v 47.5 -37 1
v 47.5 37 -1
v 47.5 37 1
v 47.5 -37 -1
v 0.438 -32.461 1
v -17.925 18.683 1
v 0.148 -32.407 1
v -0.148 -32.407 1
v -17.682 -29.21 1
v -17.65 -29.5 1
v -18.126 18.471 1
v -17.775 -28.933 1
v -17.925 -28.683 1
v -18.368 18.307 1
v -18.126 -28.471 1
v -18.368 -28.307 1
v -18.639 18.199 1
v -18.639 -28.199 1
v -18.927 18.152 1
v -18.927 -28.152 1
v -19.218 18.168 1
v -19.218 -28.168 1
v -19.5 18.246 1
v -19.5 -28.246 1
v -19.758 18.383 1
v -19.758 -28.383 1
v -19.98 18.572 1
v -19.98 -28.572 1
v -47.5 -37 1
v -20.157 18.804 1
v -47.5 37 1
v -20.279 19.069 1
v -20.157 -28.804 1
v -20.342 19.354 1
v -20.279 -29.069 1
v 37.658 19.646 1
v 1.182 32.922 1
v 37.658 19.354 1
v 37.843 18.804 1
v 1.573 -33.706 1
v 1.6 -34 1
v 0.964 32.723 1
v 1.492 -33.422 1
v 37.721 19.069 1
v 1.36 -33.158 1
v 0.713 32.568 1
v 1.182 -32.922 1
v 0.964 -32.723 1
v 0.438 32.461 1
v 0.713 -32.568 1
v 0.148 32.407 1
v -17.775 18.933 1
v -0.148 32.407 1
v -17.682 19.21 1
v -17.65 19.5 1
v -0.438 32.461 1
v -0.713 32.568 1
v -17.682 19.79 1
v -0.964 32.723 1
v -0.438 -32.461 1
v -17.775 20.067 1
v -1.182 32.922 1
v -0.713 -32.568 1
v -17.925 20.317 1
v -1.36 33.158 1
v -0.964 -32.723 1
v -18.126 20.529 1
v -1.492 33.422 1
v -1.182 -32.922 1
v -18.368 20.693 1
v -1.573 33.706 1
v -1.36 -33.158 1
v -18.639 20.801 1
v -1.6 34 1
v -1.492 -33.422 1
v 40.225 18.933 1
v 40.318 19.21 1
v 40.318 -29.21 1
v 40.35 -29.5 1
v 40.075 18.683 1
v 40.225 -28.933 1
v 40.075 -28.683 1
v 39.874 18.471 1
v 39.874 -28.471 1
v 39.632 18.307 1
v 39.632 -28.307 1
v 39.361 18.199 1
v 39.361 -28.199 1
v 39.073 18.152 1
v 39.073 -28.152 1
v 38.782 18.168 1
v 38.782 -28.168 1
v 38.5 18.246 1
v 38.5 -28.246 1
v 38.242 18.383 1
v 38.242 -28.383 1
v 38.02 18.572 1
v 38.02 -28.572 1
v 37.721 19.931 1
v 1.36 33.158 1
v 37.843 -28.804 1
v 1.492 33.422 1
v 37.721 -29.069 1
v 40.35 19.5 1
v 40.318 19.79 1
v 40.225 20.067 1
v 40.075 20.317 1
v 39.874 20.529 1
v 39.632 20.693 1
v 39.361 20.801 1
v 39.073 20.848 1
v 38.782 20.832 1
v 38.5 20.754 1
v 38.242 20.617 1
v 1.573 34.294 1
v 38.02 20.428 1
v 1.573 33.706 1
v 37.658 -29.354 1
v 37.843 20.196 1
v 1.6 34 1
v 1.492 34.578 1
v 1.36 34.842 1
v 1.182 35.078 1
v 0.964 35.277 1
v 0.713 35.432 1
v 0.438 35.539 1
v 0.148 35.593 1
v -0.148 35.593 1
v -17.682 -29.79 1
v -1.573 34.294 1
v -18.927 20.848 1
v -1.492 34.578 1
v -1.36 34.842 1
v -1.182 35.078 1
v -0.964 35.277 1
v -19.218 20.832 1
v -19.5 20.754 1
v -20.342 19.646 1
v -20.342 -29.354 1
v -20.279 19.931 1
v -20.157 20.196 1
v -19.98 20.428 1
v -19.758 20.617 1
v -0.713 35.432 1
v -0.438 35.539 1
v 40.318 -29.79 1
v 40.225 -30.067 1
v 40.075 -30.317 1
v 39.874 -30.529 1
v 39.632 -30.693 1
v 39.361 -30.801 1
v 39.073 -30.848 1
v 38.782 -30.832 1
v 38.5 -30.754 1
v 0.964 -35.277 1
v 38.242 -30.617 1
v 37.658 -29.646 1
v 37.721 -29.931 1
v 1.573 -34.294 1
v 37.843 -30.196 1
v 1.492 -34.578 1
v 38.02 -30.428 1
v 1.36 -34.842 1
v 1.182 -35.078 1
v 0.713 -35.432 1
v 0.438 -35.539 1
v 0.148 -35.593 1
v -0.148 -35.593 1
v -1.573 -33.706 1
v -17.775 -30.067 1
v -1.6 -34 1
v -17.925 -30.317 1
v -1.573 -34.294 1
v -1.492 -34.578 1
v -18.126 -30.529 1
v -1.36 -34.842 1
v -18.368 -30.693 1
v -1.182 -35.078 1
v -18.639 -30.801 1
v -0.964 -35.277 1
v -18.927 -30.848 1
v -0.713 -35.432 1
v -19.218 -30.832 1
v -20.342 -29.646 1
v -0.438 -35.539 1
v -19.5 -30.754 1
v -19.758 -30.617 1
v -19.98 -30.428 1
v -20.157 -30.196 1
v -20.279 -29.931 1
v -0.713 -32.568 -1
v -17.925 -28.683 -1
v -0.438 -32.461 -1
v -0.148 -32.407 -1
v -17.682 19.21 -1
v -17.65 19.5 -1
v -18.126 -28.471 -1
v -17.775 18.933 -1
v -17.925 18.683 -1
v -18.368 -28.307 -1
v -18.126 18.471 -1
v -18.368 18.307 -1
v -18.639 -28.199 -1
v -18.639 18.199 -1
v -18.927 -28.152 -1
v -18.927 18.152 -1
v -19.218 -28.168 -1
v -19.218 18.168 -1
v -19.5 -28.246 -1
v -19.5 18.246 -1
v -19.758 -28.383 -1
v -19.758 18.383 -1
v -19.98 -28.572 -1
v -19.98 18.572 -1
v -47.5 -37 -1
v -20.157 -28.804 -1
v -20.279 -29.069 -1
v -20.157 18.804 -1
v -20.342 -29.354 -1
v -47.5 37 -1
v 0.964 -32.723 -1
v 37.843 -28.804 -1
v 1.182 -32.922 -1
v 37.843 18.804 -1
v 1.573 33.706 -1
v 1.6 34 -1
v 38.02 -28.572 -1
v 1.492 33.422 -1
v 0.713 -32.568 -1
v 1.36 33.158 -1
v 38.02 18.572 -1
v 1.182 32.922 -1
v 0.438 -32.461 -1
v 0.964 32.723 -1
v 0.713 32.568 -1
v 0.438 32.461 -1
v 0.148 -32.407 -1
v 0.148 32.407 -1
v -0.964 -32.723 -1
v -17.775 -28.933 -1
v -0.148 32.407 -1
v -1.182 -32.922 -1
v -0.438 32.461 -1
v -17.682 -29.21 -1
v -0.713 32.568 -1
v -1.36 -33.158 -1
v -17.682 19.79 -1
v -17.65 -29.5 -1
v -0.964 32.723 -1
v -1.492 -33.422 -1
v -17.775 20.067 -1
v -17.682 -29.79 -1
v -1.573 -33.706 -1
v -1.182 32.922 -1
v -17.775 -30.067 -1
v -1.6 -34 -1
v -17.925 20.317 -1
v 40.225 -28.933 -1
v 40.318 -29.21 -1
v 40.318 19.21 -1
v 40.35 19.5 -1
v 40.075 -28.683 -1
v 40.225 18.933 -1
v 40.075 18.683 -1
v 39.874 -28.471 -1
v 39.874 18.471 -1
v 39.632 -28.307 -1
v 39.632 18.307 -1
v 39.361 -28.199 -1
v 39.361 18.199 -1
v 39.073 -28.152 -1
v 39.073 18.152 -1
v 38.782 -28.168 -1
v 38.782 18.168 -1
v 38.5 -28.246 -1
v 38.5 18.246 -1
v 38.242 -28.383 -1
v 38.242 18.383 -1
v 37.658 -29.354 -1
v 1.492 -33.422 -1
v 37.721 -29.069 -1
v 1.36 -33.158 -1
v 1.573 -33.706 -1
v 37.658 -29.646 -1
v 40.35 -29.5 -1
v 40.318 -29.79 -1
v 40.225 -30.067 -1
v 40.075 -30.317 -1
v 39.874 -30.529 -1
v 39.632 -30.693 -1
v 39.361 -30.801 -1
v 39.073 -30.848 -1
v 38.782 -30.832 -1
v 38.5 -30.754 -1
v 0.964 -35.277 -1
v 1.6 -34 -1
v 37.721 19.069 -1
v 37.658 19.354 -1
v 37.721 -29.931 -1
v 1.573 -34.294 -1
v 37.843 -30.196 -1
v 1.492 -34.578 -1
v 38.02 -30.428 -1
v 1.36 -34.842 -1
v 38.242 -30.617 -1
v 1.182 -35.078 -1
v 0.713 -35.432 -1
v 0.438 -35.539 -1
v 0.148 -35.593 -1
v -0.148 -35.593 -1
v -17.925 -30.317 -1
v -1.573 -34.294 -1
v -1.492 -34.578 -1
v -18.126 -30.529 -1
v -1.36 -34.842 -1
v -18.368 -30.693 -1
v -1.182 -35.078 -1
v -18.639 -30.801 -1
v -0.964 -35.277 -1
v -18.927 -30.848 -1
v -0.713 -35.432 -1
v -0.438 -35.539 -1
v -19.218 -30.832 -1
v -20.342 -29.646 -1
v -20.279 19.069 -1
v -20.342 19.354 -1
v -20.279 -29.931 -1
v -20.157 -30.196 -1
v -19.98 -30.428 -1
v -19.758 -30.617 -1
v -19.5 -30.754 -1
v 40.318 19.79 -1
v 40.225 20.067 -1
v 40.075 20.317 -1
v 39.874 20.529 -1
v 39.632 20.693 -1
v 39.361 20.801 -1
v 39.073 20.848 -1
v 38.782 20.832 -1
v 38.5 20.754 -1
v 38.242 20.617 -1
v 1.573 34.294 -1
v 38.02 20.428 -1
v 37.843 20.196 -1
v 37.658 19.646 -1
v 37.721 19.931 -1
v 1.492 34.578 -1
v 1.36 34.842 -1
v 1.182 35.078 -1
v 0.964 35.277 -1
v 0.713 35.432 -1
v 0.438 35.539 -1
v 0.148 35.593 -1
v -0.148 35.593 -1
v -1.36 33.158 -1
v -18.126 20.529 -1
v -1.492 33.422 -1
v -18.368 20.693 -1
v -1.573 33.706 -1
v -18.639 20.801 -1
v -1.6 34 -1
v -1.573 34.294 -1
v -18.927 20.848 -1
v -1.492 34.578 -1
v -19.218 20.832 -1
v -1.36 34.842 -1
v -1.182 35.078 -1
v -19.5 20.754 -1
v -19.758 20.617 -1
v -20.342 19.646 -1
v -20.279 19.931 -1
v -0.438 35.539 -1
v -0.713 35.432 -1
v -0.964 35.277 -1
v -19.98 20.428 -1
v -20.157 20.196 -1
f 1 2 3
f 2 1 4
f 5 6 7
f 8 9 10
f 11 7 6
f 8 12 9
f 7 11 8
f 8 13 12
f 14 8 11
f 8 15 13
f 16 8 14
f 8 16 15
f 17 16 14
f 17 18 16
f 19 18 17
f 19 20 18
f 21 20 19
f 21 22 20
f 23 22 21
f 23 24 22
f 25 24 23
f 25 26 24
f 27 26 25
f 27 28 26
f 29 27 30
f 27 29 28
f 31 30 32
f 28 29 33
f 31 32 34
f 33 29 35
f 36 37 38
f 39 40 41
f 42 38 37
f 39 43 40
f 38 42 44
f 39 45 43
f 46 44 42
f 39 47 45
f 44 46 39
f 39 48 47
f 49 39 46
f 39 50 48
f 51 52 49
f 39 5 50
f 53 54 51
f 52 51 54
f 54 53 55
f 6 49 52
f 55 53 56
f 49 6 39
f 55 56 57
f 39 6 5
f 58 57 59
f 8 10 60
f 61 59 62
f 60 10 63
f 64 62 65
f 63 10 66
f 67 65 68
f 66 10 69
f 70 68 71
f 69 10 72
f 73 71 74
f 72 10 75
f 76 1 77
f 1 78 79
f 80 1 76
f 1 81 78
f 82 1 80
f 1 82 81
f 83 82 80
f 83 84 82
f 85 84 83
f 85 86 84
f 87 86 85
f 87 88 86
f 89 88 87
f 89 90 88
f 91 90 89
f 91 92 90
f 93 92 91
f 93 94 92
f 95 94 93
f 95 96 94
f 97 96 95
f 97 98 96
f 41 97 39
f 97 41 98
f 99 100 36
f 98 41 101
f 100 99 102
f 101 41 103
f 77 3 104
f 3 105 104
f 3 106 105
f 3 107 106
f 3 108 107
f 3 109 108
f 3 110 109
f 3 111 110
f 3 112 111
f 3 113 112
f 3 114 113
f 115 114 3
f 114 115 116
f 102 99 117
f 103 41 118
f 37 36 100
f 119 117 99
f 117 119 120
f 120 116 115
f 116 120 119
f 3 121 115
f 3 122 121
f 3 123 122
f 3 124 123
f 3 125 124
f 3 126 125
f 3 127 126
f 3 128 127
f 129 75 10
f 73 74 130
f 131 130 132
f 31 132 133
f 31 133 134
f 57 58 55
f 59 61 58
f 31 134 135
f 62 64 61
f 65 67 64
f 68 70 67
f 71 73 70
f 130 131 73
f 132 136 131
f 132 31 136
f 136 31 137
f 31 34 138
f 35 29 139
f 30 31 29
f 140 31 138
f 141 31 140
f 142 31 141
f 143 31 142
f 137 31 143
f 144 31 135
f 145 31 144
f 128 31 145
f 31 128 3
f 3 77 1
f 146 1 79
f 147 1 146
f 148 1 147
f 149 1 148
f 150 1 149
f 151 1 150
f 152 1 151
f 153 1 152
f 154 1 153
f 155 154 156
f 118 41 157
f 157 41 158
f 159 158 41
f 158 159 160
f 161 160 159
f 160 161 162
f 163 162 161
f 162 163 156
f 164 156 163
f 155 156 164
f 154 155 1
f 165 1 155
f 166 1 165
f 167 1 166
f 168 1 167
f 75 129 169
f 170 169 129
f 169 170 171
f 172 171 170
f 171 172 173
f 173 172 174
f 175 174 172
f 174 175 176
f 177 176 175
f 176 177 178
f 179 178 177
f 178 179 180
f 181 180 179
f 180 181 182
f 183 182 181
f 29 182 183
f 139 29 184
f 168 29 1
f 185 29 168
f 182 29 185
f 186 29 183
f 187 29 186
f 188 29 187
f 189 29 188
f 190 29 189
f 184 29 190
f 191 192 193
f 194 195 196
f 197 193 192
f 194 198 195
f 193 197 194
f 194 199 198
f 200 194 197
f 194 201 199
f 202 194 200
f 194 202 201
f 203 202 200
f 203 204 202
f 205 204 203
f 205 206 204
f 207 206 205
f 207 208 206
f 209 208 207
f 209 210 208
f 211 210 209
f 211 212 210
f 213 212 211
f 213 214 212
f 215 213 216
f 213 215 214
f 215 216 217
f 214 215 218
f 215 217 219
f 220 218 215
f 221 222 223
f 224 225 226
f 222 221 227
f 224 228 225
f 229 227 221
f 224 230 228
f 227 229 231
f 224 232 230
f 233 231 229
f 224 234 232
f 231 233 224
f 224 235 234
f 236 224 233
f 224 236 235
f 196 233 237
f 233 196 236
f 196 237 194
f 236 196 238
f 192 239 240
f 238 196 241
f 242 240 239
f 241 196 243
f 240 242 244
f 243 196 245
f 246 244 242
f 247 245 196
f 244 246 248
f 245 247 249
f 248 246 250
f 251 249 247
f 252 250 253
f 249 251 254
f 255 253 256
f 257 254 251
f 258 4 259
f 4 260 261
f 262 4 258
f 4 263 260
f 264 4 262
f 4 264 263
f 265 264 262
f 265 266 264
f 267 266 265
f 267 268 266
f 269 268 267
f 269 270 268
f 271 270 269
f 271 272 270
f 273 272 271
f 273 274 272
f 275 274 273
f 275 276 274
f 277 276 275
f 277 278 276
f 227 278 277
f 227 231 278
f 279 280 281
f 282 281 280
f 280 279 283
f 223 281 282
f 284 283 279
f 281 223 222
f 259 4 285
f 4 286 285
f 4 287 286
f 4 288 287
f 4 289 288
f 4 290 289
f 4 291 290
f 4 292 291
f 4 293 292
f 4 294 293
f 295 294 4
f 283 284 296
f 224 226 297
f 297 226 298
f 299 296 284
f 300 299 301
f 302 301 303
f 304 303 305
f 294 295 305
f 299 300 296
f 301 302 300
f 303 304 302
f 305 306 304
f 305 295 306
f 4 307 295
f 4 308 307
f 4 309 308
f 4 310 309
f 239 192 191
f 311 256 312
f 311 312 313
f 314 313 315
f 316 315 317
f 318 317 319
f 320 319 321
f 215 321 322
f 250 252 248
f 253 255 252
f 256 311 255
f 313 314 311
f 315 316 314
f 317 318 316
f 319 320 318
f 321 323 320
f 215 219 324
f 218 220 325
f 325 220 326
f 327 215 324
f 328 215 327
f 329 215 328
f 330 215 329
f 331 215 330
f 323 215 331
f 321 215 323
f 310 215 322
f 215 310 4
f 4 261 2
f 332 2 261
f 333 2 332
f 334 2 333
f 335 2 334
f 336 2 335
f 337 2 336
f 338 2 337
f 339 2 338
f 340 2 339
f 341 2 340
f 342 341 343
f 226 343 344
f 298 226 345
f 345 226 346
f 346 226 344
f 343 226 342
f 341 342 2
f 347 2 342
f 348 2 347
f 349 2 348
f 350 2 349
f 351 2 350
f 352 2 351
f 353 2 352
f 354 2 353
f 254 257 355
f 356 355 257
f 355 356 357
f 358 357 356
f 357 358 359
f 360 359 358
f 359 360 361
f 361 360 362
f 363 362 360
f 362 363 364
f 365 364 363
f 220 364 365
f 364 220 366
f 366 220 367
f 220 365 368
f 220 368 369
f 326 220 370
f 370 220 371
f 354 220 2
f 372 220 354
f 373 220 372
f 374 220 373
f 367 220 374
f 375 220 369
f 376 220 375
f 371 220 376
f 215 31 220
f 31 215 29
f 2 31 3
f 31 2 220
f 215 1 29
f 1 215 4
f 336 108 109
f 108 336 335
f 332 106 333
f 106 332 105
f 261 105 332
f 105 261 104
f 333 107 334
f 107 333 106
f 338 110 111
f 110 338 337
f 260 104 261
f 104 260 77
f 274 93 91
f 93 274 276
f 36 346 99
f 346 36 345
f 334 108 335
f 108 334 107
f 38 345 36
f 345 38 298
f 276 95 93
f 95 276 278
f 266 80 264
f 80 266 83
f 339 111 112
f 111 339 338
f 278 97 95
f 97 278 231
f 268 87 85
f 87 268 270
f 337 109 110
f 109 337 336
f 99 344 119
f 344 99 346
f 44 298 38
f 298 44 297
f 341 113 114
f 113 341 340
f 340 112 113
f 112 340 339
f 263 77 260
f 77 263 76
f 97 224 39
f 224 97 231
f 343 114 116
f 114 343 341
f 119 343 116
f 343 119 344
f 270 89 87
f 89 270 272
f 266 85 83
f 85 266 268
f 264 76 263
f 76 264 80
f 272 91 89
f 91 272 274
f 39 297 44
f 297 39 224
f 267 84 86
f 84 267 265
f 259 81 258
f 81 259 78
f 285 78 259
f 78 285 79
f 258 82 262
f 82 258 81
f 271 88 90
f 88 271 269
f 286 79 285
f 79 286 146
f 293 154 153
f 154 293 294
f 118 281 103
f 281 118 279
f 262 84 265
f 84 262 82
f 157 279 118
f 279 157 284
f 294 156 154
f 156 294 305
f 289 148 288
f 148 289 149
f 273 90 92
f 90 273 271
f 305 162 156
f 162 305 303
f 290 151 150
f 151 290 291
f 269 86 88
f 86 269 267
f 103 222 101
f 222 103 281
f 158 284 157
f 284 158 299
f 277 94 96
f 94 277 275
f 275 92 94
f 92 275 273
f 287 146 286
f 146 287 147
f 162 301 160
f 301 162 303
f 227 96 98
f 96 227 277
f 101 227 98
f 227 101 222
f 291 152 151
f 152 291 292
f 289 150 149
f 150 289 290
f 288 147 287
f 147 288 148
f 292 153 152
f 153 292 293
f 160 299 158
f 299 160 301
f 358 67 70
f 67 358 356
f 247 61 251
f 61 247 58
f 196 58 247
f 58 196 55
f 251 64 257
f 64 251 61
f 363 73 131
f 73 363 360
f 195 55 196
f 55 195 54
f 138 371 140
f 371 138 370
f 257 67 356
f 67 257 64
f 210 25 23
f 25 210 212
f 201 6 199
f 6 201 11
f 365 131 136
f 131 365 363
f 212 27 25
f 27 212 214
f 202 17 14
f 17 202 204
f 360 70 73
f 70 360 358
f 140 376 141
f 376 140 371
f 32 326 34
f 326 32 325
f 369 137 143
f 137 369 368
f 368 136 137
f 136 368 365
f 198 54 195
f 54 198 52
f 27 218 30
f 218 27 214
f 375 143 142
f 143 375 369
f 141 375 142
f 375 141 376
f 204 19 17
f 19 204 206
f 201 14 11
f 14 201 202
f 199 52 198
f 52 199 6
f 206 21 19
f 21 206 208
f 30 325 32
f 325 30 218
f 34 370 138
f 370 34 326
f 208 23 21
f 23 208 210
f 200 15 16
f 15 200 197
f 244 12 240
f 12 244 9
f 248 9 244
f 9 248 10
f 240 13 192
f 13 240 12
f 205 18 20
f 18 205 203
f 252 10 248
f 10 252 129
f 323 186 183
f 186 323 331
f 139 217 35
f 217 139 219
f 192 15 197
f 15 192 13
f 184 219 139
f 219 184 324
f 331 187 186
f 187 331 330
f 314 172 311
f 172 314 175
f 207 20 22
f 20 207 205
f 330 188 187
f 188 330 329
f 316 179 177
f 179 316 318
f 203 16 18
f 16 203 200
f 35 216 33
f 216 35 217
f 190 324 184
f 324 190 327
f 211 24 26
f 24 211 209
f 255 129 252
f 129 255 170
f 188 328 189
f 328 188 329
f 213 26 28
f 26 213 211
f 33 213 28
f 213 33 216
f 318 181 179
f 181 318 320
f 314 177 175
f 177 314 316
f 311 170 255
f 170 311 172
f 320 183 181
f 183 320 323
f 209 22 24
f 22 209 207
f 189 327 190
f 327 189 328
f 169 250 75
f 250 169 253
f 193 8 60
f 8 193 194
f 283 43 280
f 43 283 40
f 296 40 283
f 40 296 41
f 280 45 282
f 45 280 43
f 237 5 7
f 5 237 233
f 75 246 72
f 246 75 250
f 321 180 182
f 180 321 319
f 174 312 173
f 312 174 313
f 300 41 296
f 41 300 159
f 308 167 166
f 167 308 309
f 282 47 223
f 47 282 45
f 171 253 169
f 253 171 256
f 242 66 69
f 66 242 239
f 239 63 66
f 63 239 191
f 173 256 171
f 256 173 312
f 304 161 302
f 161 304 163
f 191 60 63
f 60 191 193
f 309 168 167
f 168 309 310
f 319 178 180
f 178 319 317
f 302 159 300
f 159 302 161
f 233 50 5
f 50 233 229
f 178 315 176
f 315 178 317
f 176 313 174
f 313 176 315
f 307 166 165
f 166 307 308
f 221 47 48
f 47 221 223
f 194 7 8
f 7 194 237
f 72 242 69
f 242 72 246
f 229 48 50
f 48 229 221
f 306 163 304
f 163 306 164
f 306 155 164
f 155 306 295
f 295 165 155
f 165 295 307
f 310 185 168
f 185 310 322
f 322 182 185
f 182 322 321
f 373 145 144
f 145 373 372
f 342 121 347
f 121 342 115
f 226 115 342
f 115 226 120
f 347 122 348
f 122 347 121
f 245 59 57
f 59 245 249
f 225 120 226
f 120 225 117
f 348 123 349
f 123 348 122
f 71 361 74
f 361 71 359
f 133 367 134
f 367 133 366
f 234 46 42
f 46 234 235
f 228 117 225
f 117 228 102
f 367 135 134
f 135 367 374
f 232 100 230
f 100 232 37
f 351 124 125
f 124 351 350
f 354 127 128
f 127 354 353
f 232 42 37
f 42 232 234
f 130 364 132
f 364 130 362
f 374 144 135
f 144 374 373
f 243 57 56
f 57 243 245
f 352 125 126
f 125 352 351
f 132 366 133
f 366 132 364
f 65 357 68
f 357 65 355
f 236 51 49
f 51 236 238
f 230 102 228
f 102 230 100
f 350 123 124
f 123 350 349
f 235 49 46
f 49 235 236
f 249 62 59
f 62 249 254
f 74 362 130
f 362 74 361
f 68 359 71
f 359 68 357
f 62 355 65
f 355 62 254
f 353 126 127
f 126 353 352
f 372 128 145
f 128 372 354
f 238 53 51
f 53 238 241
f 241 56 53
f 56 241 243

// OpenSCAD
// file: Cos.scad
include <config.scad>

$fa = 3;
$fs = 0.3;

// Cos principal

module cilindre(D=diameter_cyli, d=inner_diameter, l=height_cyli){
rotate([0,90,0])
difference(){
cylinder(h=l,d=D,center=true);
    cylinder(h=l+0.05,d=d,center=true);
}

}


module semi_esfera(D=diameter_cyli, d=inner_diameter){
difference(){
difference(){
    sphere(d=D);
    sphere(d=d);
    }
    translate([-d,0,0])
    cube(size=d*2,center=true);
}
}
module cos_principal(D=diameter_cyli, d=inner_diameter, l=height_cyli){
union(){
color("yellow",0.5){
cilindre(D=D, d=d, l=l);
    
}
translate([l/2,0,0])
color([0,1,1],0.6){
semi_esfera(D=D, d=d);}
}
}
cos_principal();
// file: config.scad
// Configuració general

// Cos principal
height_cyli = 298;
wall_width = 6.35;
inner_diameter = 76;
diameter_cyli = inner_diameter + wall_width*2;

// Bateria LIPO
w1 = 47;
h1 = 26;

// Bateria Raspi
w2 = 61;
h2 = 21;
// file: estruct_intern.scad
include <config.scad>
use <Cos.scad>

$fa = 2;
$fs = 0.3;

// Moduls
module suport_lipo(thickness=5, diameter=inner_diameter-0.5, h=26, w=47){
rotate([0,90,0])
difference() {
cylinder(h=thickness, d=diameter, center=true);

// Bateria LIPO
translate([10,0,0])
color("#00c5ff") cube([h+0.4,w+0.4,thickness+0.5],center=true);
    translate([-20,0,0])
    cube([10,30,thickness+0.5],center=true);
    translate([30,0,0])
    cylinder(h=thickness+0.2,d=6.2,center=true);
    
    translate([-10,20,0])
    cylinder(h=thickness+0.2, d=6.2, center=true);
    translate([-10,-20,0])
    cylinder(h=thickness+0.2, d=6.2, center=true);
     translate([-5,-inner_diameter/2+5-1,0])
    cylinder(h=thickness+05,d=4,center=true);
        translate([-5,-(-inner_diameter/2+5-1),0])
        cylinder(h=thickness+05,d=4,center=true);
    
}
}
module suport_bater(thickness=5, diameter=inner_diameter-0.5, h=21, w=61){
rotate([0,90,0])
difference() {
cylinder(h=thickness, d=diameter, center=true);

// Bateria raspy
translate([h2/2-3,0,0])
color("#00c5ff") cube([h+0.4,w+0.4,thickness+0.5],center=true);
    difference(){
cylinder(h=thickness+0.3, d=diameter-25, center=true);
translate([20,0,0])
        cube([20,40,thickness],center=true);
        }
        translate([-30,0,0])
        rotate([0,90,0])
        cylinder(h=20, d=4, center=true);
        translate([30,0,0])
 cylinder(h=thickness+0.2,d=6.2,center=true);
        translate([-5,-inner_diameter/2+5-1,0])
        cylinder(h=thickness+05,d=4,center=true);
        translate([-5,-(-inner_diameter/2+5-1),0])
        cylinder(h=thickness+05,d=4,center=true);
        
       
}}

module lipo(l=155, h=26, w=47){
    color("#baa0a9") cube([l,w,h],center=true);
}

module batery(l=90, h=21, w=61){
    color("#135363") cube([l,w,h],center=true);
}
module suport_raspi(){
    
    difference(){
    color("#248113") cube([95,74,2],center=true);
        translate([85/2-3.5,19.5,0])
        cylinder(h=2.2,d=2.7,center=true);
        translate([85/2-3.5,-29.5,0])
        cylinder(h=2.2,d=2.7,center=true);
        translate([-19,19.5,0])
        cylinder(h=2.2,d=2.7,center=true);
        translate([-19,-29.5,0])
        cylinder(h=2.2,d=2.7,center=true);
        translate([0,-34,0])
        cylinder(h=2.2, d=3.2,center=true);
        translate([0,+34,0])
        cylinder(h=2.2, d=3.2,center=true);
        }
        
    
}
module camera(){
    union(){
    color("#3a3a3a") cylinder(h=6, d=14, center=true);
    translate([-3,0,-3.5])
        difference(){
    color("#c33310") cube([24,25,1],center=true);
            translate([10,21/2,0])
            cylinder(h=1.1, d=2, center=true);
            translate([10,-21/2,0])
            cylinder(h=1.1, d=2, center=true);
            translate([-4,21/2,0])
            cylinder(h=1.1, d=2, center=true);
            translate([-4,-21/2,0])
            cylinder(h=1.1, d=2, center=true);
        }
    }
}




module suport_camera(){
    difference(){
    cylinder(h=5, d=63-0.4, center=true);
        translate([7, 21/2,0])
        cylinder(h=5.1, d=2, center=true);
        translate([-7, 21/2,0])
        cylinder(h=5.1, d=2, center=true);
        translate([7,-21/2,0])
        cylinder(h=5.1, d=2, center=true);
        translate([-7, -21/2,0])
        cylinder(h=5.1, d=2, center=true);
        translate([-18,0,0])
        cube([6,24,5.1],center=true);
        
        translate([-10,20,0])
    cylinder(h=5+0.2, d=6.2, center=true);
    translate([-10,-20,0])
    cylinder(h=5+0.2, d=6.2, center=true);
    }
}



// Visualització
translate([130,0,0])
color("#0000aa" )suport_lipo(diameter=inner_diameter-0.5,thickness=8);

translate([-60,0,0])
suport_bater(thickness=8, diameter=inner_diameter-0.5, h=h2, w=w2);
translate([-90/2,0,-h2/2+3])
batery(h=h2, w=w2);

translate([155/2,0,-10])
lipo(h=h1, w=w1);

translate([65,0,4.2])
suport_raspi();

translate([180,0,0])
rotate([0,90,0])
camera();

translate([172,0,0])
rotate([0,90,0])
color("#f59102") suport_camera();

// Barres de unió
g = 5;

module barra(l=180,g=6, h=6){
    color("#e114e2")union(){
translate([0,0,-2])
cube([l,g,4], center=true);
translate([10,0,0])
cube([120,g,h+1],center=true);
        difference(){
translate([l/2-0.5,0,2])
    cube([3, g, h+6], center=true);
translate([l/2-0.5,0,5])
    rotate([0,90,0])
    cylinder(h=3.2,d=4,center=true);
            }
        difference(){
translate([-l/2+0.5,0,2])
    cube([3,g,h+6],center=true);
translate([-l/2+0.5,0,5])
rotate([0,90,0])
    cylinder(h=3.2,d=4,center=true);
        }


}
}

translate([35,-inner_diameter/2+g-1,0])
barra(l=180,h=6);
translate([35,inner_diameter/2-g+1,0])
barra(l=180,h=6);
module barra_roscada(l=195,d=6){
rotate([0,90,0])
color("gray") cylinder(h=l, d=d,center=true);
}
translate([35,0,-30])
barra_roscada();
translate([150,20,10])
barra_roscada(l=40);
translate([150,-20,10])
barra_roscada(l=40);
// main file
use <estruct_intern.scad>
include <config.scad>

suport_raspi();
